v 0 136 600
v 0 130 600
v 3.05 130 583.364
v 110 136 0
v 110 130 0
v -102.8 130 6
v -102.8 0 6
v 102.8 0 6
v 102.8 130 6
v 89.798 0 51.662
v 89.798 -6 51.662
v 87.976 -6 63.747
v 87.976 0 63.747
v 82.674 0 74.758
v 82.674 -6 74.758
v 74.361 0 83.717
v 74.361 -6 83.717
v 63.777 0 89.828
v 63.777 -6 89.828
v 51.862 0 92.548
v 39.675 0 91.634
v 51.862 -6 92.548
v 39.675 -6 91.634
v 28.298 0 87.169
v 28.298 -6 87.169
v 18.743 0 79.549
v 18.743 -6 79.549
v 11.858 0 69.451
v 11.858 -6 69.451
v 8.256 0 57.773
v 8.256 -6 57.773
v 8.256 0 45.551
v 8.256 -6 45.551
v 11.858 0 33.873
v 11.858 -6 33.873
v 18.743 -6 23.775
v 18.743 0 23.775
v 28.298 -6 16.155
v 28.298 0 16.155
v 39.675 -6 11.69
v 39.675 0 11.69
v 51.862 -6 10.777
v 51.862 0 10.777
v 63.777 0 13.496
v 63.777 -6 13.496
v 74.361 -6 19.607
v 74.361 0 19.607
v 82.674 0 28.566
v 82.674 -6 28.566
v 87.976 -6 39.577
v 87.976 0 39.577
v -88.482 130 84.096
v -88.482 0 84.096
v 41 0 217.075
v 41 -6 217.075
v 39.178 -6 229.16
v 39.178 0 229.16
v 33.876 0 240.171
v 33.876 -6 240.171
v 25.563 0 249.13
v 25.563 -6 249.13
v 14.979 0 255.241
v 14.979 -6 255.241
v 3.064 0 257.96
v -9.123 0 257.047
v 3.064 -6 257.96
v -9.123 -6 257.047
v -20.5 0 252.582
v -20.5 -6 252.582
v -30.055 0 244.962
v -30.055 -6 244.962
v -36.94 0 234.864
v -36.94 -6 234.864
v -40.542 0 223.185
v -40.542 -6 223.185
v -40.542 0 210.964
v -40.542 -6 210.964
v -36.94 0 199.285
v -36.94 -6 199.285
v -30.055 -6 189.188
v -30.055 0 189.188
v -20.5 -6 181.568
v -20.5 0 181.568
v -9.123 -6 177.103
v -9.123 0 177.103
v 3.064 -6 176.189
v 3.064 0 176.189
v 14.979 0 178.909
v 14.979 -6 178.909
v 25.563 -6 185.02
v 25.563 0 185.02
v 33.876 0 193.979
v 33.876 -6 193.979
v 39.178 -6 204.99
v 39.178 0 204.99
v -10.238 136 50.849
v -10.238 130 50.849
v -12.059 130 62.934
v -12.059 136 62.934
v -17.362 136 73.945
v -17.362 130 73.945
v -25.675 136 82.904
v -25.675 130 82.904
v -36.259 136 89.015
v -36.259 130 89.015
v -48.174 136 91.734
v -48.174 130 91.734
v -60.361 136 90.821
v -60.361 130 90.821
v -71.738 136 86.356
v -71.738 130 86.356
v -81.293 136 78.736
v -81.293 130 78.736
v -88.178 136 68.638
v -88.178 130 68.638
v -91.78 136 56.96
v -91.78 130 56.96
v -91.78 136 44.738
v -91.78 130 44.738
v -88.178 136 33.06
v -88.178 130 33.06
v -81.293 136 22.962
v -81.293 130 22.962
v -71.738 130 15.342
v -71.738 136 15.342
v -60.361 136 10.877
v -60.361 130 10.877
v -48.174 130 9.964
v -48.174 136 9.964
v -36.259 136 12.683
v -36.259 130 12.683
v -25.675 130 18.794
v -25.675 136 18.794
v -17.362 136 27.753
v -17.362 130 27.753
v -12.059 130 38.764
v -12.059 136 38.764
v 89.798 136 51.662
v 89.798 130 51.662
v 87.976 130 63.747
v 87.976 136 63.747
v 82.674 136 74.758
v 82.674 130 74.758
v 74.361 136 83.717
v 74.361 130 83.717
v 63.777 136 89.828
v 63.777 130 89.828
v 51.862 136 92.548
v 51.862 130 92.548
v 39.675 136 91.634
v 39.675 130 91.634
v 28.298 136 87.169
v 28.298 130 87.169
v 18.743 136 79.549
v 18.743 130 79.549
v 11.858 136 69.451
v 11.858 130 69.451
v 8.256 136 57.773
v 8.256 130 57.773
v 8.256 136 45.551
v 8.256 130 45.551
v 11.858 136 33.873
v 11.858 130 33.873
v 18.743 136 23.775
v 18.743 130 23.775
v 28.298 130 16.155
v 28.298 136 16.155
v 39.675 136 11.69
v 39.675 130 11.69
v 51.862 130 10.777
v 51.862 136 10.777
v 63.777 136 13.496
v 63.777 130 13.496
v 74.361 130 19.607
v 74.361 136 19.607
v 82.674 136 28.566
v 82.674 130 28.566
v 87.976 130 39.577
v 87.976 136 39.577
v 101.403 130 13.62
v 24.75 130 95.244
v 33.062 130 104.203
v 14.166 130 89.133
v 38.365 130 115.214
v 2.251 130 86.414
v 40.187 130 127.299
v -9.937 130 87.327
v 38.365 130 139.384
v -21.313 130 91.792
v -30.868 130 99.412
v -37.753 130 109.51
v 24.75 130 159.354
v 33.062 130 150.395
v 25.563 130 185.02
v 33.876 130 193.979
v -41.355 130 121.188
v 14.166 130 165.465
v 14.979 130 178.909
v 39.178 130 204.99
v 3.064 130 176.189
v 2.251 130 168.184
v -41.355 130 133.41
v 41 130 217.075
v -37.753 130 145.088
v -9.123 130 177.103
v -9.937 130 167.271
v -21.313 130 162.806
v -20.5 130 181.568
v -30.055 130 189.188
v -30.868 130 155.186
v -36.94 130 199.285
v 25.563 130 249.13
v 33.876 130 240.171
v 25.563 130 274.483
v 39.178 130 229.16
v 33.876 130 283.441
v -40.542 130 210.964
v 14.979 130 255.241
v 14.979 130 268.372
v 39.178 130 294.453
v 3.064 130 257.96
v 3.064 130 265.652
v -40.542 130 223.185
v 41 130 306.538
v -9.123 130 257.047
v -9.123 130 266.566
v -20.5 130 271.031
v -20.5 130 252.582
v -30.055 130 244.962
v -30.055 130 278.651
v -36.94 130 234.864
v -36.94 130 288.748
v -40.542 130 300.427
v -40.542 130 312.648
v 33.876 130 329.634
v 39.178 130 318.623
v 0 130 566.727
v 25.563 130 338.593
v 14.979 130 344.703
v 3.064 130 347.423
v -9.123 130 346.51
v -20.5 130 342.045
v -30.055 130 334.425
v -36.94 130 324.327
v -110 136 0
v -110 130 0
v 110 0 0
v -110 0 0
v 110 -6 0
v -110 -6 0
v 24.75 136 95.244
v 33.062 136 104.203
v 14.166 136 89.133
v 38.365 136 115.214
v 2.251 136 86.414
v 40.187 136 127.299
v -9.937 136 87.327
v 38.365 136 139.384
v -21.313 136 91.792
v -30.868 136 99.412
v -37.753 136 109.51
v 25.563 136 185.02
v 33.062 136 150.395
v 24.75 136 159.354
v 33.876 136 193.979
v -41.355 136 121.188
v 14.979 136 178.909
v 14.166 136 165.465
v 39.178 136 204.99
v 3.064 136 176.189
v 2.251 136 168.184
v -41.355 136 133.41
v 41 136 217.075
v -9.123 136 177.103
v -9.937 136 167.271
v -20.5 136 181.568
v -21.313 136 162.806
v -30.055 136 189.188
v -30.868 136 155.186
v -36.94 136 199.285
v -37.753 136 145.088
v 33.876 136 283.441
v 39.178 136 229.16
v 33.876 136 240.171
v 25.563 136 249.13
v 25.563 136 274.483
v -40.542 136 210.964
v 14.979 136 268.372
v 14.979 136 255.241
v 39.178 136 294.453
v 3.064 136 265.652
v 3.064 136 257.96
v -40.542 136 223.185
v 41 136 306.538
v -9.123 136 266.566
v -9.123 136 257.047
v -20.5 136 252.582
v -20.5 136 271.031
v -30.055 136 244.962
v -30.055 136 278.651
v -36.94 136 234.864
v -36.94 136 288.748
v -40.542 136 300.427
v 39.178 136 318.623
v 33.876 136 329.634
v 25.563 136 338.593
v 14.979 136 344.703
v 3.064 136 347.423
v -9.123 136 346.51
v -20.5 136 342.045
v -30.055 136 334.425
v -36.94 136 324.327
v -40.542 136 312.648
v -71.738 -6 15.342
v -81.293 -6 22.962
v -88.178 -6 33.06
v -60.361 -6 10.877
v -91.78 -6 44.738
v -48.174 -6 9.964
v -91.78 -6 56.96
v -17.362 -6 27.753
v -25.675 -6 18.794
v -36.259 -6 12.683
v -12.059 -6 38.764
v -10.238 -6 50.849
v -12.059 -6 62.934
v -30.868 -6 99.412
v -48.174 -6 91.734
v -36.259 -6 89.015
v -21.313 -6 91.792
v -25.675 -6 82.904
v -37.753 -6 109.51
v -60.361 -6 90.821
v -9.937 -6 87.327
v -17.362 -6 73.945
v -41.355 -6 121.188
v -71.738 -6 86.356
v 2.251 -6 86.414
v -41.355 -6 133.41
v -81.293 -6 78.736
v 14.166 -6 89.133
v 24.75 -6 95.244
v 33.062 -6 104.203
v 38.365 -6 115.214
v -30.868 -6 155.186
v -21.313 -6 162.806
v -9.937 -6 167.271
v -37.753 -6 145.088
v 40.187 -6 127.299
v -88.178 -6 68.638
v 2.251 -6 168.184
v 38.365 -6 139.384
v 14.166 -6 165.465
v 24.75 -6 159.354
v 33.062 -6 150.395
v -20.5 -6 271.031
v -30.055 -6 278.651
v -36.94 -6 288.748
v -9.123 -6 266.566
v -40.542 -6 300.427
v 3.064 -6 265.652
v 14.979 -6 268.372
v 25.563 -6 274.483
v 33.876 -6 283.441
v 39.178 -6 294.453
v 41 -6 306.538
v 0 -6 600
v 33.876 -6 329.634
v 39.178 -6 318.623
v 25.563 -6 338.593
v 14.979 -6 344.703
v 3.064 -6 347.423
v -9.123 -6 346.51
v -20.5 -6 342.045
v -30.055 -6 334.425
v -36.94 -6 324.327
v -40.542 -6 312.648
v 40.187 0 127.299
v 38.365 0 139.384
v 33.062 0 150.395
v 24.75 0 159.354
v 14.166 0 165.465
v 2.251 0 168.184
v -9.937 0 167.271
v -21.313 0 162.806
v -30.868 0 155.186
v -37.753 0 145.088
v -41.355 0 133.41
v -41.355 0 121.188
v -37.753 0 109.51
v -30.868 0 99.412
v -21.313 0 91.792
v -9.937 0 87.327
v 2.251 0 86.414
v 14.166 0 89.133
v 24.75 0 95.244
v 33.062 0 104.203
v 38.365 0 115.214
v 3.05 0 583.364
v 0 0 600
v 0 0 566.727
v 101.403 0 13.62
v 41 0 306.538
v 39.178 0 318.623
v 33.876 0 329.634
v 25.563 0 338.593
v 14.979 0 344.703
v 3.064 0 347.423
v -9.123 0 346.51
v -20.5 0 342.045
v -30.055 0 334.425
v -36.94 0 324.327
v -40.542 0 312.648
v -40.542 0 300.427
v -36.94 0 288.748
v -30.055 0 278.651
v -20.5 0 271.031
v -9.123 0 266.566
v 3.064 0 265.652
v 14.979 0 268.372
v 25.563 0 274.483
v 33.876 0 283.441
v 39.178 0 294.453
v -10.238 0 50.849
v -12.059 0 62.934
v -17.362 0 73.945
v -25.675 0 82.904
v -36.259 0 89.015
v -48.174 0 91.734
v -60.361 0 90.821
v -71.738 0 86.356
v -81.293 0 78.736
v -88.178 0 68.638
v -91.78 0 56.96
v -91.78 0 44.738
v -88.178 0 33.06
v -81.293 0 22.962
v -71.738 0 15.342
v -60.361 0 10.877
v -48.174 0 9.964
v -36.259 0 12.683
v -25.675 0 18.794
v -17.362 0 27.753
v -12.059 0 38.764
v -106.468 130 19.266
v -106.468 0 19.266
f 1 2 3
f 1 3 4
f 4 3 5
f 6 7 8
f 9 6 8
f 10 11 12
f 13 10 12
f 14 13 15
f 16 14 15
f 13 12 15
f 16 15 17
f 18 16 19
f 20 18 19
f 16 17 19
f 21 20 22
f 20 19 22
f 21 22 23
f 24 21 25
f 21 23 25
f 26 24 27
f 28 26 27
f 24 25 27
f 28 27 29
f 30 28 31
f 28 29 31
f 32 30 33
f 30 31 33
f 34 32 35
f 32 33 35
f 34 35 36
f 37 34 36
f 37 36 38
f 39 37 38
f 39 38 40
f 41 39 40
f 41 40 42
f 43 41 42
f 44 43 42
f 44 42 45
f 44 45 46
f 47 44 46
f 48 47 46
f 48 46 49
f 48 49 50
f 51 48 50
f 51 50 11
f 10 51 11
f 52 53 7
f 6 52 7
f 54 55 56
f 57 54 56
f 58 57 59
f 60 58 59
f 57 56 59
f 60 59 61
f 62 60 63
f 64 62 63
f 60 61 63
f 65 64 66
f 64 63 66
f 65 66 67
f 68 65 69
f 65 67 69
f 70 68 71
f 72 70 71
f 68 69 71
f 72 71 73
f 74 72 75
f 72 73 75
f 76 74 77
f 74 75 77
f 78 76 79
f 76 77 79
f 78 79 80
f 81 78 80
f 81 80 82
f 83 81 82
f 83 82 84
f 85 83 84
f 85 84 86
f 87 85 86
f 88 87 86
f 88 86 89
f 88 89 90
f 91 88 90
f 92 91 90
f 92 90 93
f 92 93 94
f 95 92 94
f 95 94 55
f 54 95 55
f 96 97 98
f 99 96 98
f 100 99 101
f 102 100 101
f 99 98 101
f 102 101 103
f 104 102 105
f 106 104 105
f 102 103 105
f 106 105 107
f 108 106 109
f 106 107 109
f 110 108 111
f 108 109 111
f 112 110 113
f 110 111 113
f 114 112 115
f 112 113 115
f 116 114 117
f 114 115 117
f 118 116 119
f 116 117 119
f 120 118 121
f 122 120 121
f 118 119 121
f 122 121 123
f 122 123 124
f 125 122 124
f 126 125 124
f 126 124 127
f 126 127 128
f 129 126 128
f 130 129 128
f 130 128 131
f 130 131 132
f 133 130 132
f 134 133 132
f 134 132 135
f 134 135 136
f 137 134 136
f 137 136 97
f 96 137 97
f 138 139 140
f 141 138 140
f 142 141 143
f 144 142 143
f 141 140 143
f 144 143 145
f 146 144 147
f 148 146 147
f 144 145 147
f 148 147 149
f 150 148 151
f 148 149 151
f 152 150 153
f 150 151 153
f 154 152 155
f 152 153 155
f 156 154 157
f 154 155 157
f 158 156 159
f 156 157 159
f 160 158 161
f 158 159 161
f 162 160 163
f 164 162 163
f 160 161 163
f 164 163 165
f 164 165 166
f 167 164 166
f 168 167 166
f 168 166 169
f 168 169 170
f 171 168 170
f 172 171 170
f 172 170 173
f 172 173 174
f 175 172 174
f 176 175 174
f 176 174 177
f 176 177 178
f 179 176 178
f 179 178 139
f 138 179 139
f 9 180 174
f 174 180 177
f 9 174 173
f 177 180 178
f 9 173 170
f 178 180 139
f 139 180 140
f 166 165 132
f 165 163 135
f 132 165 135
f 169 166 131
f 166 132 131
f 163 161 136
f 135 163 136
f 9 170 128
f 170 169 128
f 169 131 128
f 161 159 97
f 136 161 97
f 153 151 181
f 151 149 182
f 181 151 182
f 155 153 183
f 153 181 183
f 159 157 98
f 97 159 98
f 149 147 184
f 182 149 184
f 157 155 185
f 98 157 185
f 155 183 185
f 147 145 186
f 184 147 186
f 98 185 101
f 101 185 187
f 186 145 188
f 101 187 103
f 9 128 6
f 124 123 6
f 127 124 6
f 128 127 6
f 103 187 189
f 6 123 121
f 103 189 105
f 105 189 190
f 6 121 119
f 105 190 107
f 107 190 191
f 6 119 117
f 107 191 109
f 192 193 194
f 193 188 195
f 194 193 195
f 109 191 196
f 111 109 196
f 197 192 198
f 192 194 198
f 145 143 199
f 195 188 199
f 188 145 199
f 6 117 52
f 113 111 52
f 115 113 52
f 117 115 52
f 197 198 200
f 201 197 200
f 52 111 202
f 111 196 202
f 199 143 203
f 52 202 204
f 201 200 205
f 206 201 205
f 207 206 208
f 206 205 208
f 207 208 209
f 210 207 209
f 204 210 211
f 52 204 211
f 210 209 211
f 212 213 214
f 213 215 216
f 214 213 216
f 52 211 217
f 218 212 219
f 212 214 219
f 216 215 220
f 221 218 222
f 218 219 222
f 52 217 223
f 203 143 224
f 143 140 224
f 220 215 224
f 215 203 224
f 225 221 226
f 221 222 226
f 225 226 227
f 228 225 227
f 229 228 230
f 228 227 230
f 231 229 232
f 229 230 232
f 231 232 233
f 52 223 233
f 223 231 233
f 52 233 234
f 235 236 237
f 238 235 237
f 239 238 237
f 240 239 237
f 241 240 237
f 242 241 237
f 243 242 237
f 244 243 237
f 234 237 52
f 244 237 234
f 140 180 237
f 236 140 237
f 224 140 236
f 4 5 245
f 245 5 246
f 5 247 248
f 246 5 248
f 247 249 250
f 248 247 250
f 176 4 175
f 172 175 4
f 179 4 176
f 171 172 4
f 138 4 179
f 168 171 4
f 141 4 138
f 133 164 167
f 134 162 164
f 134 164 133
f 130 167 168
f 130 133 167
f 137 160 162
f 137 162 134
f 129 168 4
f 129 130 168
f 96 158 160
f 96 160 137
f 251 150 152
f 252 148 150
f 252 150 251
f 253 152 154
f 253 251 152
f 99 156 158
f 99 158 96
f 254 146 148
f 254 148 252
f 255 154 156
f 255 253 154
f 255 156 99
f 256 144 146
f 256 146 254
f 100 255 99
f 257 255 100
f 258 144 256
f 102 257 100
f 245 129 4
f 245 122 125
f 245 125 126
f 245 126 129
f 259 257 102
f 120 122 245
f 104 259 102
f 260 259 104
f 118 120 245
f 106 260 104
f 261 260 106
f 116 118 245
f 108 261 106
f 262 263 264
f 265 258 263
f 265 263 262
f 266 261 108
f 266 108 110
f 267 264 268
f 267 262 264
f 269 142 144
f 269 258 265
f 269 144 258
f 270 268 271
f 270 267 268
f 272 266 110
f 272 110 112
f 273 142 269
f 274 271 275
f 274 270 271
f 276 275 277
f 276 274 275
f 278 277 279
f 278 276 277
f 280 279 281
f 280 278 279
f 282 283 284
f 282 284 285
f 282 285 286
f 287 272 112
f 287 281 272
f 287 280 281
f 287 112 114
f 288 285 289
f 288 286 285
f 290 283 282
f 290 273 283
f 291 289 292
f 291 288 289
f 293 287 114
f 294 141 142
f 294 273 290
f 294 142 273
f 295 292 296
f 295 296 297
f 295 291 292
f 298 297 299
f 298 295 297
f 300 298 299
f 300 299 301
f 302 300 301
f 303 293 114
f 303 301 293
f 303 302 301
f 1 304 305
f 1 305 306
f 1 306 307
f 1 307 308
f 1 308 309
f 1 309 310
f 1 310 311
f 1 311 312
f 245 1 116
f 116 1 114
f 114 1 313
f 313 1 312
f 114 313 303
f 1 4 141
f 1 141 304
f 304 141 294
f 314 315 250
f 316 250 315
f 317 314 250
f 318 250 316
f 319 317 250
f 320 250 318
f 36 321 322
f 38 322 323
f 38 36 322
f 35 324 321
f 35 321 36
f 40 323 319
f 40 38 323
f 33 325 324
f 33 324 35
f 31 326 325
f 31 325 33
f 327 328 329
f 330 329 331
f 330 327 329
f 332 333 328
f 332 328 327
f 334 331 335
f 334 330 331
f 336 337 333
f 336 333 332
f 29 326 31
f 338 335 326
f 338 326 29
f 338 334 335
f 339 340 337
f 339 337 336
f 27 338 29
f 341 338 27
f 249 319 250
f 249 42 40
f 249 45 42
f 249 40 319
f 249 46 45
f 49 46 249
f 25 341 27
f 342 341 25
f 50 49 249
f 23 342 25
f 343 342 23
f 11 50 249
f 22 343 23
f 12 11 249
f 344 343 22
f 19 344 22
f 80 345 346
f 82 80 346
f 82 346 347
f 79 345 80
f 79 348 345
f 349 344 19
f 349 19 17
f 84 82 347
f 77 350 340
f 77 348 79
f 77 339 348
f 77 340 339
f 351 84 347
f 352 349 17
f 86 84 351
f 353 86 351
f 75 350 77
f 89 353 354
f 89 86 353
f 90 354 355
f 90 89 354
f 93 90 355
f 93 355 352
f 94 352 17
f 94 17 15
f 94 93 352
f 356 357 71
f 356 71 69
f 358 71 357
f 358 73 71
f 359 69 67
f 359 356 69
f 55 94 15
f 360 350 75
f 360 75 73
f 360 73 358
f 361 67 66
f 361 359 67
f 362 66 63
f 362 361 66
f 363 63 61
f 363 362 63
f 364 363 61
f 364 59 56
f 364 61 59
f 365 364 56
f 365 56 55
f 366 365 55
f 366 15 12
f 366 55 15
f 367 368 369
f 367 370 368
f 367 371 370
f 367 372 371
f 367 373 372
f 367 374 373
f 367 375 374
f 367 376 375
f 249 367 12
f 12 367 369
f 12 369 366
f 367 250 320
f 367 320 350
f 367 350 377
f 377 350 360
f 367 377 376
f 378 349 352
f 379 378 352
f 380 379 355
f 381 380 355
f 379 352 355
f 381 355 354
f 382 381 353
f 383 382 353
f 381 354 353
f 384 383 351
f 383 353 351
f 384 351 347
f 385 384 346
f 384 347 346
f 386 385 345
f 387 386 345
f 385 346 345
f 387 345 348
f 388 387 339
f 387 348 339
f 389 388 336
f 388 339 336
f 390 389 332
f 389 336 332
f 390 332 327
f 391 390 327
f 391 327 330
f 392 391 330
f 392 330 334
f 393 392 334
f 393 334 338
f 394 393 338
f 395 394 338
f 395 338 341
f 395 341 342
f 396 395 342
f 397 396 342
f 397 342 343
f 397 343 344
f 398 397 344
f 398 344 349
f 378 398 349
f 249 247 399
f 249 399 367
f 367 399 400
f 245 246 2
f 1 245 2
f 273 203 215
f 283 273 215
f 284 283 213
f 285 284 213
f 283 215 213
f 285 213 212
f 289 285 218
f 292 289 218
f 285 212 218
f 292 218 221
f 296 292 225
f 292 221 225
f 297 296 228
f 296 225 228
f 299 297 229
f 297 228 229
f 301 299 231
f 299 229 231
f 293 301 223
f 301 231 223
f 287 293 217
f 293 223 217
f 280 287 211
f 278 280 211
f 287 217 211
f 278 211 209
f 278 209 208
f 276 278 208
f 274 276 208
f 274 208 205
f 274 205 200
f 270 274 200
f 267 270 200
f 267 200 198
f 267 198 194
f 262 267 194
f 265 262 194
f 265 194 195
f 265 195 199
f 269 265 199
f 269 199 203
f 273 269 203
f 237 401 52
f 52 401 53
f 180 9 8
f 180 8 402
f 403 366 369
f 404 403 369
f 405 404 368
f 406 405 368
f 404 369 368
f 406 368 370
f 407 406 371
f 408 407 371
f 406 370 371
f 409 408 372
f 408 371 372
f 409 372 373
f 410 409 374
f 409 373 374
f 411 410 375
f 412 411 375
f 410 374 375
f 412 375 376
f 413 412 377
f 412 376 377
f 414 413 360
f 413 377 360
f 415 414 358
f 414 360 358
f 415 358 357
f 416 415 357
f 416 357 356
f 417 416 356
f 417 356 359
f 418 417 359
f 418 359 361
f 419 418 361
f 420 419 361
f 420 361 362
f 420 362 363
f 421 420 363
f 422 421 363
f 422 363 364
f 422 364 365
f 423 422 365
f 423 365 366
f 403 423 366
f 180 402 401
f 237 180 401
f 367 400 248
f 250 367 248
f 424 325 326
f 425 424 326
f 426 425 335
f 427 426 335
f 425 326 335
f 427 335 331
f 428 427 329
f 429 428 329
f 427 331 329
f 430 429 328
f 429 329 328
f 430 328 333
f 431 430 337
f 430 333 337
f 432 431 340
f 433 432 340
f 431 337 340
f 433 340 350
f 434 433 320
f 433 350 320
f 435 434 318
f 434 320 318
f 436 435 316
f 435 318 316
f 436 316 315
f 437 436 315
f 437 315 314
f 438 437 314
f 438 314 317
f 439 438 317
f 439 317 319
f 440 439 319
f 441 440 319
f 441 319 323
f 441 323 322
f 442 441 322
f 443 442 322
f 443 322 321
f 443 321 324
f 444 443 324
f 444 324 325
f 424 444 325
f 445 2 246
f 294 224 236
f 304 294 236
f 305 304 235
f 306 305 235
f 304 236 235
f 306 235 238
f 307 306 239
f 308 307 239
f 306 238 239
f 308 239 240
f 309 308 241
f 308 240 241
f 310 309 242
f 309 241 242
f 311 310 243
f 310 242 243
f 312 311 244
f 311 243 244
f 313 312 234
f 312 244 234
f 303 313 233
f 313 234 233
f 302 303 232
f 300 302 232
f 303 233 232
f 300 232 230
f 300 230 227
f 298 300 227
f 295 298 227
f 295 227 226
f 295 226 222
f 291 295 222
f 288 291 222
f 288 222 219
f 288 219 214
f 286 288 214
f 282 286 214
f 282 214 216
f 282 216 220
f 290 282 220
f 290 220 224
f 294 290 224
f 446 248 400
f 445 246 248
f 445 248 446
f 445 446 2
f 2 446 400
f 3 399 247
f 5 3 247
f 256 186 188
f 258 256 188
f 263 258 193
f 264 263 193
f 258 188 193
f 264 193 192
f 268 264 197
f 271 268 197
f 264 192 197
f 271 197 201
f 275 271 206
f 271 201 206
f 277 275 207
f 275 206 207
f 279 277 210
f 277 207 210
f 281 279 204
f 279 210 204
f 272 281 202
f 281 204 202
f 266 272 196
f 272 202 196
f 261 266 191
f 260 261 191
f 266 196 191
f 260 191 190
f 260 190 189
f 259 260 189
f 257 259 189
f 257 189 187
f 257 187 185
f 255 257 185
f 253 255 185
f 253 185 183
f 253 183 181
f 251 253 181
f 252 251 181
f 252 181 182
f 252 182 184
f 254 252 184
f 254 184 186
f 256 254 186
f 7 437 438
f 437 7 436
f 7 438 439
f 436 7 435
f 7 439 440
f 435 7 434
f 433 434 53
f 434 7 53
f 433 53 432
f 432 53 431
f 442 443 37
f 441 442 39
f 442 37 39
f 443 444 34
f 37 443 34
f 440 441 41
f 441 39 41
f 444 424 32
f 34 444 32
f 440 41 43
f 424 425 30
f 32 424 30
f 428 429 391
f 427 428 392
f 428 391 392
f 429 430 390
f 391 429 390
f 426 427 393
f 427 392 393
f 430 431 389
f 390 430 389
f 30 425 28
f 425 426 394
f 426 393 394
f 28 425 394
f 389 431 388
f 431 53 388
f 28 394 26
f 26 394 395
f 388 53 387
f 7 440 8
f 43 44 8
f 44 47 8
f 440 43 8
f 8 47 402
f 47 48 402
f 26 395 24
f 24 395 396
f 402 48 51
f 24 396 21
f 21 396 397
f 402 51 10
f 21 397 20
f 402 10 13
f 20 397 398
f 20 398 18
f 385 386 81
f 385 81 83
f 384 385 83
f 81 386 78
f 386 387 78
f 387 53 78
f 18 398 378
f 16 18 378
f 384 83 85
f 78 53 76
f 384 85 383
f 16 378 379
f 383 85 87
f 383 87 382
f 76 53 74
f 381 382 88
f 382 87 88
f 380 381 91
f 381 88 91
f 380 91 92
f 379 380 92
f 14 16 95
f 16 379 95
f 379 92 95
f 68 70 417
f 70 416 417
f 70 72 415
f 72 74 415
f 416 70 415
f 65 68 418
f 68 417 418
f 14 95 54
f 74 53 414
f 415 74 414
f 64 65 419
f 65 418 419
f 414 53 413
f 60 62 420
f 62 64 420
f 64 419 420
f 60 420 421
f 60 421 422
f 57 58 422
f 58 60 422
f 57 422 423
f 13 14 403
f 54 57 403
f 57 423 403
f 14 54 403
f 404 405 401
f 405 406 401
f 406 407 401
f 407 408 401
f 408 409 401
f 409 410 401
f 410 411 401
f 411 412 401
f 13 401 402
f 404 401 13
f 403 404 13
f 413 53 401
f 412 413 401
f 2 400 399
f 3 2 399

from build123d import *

# Parameters (mm, degrees)
F1_DEPTH  = 6
F3_DEPTH  = 130
F5_DEPTH  = 130
F7_DEPTH  = 130
F9_DEPTH  = 6
F10_R     = 41
F11_DEPTH = 309.88


with BuildPart() as f1:
    # F0 (on Front) → F1 (new body)
    with BuildSketch(Plane.XZ):
        Polygon((-110, 0), (0, 0), (110, 0), (0, 600), align=None)
    extrude(amount=F1_DEPTH)

    # F2 (on face) → F3 (join)
    with BuildSketch(Plane(origin=(0, 0, 0), x_dir=(-1, 0, 0), z_dir=(0, 1, 0))):
        Polygon((110, 0), (106.467944, 19.265758), (0, 600), (-3.05, 583.363636), (0, 566.727273), (88.482445, 84.095757), (103.9, 0), align=None)
    extrude(amount=F3_DEPTH)

    # F4 (on face) → F5 (join)
    with BuildSketch(Plane(origin=(0, 0, 0), x_dir=(-1, 0, 0), z_dir=(0, 1, 0))):
        Polygon((0, 566.727273), (-3.05, 583.363636), (-110, 0), (-103.9, 0), (-101.40299, 13.620052), align=None)
    extrude(amount=F5_DEPTH)

    # F6 (on face) → F7 (join)
    with BuildSketch(Plane(origin=(0, 0, 0), x_dir=(-1, 0, 0), z_dir=(0, 1, 0))):
        Polygon((-102.8, 6), (-103.9, 0), (103.9, 0), (102.8, 6), (94.243981, 6), (-89.78457, 6), align=None)
    extrude(amount=F7_DEPTH)

    # F8 (on face) → F9 (join)
    with BuildSketch(Plane(origin=(0, 130, 0), x_dir=(-1, 0, 0), z_dir=(0, 1, 0))):
        Polygon((110, 0), (0, 600), (-110, 0), align=None)
    extrude(amount=F9_DEPTH)

    # F10 (on face) → F11 (cut)
    with BuildSketch(Plane.XZ.offset(6)):
        with Locations((48.797943, 51.662218)):
            Circle(F10_R)
        with Locations((-51.237836, 50.848916)):
            Circle(F10_R)
        with Locations((-0.8133, 127.299026)):
            Circle(F10_R)
        with Locations((0, 217.074677)):
            Circle(F10_R)
        with Locations((0, 306.537598)):
            Circle(F10_R)
    extrude(amount=-F11_DEPTH, mode=Mode.SUBTRACT)


solid = f1.part
